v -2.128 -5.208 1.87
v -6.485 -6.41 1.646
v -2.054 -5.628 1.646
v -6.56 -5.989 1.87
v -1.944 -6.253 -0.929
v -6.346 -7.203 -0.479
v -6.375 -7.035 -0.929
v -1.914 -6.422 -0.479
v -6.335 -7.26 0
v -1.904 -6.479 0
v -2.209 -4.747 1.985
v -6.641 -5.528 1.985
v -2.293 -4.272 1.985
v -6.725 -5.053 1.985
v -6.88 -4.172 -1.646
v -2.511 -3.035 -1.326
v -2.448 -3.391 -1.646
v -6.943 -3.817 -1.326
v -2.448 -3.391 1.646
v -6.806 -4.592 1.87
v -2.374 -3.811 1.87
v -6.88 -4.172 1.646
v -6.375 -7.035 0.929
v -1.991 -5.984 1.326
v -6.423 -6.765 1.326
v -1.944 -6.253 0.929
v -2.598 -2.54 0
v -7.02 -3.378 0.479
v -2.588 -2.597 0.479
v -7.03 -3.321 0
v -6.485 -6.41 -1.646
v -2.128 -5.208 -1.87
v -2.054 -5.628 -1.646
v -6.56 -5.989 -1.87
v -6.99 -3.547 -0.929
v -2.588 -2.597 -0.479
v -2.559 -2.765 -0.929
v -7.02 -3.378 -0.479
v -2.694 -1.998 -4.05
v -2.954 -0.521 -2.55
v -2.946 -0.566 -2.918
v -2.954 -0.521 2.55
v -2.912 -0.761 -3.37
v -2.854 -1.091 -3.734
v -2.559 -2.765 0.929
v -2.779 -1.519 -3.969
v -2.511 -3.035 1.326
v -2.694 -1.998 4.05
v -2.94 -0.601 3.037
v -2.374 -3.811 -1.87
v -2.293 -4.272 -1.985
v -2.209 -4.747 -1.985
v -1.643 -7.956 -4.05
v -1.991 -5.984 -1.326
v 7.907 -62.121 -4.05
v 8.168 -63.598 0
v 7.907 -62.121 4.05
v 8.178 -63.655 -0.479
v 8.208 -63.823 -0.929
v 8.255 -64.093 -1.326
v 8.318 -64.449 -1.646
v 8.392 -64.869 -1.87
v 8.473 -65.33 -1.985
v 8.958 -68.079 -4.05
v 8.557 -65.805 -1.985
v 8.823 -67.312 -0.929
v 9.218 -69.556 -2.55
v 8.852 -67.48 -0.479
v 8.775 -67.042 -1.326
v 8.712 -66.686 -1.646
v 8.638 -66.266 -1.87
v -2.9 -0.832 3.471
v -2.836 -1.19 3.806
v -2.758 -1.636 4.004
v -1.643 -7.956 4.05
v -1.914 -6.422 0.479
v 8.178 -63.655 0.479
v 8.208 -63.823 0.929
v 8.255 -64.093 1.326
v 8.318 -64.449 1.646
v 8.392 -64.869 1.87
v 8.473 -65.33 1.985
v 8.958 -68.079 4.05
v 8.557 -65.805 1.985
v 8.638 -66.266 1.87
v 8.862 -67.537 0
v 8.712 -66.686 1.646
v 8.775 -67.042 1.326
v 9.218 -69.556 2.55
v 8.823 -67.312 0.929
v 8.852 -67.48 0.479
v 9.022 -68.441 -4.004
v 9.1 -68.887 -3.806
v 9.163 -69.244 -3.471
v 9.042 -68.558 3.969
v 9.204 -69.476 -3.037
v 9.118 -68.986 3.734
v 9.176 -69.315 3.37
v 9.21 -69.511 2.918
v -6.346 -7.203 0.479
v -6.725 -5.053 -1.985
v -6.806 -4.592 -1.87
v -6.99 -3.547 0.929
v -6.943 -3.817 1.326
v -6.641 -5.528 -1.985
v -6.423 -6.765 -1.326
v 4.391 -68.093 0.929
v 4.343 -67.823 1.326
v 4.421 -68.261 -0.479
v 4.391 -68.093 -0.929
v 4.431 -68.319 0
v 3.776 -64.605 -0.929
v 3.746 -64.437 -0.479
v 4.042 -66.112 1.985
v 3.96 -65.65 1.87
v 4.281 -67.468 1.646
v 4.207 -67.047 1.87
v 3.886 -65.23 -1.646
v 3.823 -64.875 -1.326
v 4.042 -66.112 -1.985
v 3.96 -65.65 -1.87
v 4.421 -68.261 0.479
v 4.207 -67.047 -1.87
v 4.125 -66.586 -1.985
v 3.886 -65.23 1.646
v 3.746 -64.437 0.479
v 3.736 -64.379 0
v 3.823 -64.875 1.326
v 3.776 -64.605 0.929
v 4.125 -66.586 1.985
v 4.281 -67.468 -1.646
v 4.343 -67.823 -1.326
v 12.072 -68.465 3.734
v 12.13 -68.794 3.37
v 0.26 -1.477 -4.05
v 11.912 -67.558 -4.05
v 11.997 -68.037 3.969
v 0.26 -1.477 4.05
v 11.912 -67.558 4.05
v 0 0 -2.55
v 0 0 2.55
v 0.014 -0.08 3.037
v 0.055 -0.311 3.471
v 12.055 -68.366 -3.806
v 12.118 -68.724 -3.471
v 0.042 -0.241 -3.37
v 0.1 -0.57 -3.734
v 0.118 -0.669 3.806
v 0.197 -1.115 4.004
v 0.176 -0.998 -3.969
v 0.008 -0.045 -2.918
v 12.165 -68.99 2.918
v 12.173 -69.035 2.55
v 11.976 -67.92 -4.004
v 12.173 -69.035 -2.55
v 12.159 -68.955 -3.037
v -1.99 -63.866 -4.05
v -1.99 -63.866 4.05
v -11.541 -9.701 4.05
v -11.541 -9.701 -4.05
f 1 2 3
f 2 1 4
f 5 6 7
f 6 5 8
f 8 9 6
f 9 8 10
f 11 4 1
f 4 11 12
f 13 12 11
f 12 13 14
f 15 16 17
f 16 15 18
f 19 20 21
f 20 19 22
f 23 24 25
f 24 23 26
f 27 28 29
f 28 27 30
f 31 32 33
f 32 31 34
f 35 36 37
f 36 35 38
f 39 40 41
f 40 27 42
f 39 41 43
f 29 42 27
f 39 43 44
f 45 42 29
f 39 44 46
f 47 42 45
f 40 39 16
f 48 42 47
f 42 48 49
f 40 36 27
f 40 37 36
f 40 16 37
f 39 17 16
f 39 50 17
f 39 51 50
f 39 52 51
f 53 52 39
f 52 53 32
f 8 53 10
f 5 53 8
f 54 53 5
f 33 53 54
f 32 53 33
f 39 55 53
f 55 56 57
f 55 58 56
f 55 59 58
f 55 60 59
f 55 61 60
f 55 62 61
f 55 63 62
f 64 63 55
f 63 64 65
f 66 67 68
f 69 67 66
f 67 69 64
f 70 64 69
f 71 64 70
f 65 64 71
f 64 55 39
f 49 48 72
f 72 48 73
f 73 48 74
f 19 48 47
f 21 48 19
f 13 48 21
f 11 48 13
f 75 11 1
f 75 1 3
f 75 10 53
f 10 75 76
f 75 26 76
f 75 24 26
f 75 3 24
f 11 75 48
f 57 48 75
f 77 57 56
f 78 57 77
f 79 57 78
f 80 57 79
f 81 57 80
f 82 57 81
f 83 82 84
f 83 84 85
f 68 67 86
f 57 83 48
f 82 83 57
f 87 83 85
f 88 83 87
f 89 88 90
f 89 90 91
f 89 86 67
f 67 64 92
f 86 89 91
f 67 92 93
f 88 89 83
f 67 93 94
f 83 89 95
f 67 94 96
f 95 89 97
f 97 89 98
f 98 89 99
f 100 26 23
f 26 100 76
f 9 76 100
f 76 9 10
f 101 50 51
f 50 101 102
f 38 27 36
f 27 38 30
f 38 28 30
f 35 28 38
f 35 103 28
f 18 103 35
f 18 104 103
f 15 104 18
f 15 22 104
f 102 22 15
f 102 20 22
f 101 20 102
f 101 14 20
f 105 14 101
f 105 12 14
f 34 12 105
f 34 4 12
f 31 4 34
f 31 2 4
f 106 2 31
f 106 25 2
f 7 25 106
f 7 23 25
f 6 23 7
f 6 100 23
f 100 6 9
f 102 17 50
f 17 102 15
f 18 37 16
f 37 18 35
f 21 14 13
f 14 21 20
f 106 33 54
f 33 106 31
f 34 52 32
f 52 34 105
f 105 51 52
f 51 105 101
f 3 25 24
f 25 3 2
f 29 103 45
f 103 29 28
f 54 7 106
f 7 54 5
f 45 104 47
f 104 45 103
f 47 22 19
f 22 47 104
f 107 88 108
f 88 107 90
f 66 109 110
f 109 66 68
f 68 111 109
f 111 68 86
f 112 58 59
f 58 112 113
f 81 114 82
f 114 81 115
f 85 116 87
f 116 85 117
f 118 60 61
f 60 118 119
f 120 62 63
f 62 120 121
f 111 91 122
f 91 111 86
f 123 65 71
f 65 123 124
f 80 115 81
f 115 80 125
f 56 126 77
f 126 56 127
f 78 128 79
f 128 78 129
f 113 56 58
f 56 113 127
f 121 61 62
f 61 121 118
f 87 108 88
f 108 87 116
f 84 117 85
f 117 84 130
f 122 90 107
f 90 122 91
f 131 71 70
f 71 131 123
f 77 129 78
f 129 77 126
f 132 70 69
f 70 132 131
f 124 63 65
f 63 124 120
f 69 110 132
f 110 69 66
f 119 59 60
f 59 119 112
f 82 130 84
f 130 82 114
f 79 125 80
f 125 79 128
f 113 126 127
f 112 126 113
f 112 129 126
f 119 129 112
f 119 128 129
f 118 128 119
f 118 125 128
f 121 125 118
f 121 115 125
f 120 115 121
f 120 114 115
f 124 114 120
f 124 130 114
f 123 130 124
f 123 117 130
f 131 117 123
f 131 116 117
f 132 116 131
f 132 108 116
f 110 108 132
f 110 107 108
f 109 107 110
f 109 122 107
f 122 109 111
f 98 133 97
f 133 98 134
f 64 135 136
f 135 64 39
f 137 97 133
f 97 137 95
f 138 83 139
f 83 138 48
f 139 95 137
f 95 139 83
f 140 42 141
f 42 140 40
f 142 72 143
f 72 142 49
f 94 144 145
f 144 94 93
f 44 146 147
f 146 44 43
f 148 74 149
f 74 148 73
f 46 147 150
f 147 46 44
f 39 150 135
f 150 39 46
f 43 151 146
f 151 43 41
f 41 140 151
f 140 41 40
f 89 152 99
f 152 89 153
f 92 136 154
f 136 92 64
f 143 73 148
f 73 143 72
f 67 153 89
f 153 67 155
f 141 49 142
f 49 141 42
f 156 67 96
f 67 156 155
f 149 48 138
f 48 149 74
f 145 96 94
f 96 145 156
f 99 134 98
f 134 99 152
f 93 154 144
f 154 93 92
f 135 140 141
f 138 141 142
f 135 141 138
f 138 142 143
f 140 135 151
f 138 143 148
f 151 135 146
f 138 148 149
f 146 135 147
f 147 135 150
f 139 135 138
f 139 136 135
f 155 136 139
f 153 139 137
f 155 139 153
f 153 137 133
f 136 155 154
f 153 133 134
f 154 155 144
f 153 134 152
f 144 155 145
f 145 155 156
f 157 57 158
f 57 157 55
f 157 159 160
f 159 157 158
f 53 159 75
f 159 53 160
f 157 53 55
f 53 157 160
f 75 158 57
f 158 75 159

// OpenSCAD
// file: util.scad
include <geometry.scad>

$fa = 1.0;
$fs = 0.5;

module each_pos(positions) {
  for (pos = positions) {
    translate([pos.x, pos.y, 0])
      children();
  }
}

// These exist because I couldn't get dims out of the DXF file for
// some reason.  OpenSCAD would return the position of the text label,
// not the actual dim.

module round(amount=4)
{
  offset(r = amount)
    offset(delta = -amount)
    children();
}

// A side (c) and two adjacent angles (A, B) given (ASA)
//
// Returns a vector where the elements are remaining sides (a and b)
// and the other angle (C).
//
// https://en.wikipedia.org/wiki/Solution_of_triangles#A_side_and_two_adjacent_angles_given_(ASA)
function triangle_asa(c, A, B) =
  let ( C = 180 - A - B
      , a = c * sin(A) / sin(C)
      , b = c * sin(B) / sin(C)
      )
  [a, b, C];

// A side (c), one adjacent angle (A) and the opposite angle (C) given (AAS)
function triangle_aas(c, A, C) =
  let ( B = 180 - A - C
      , a = c * sin(A) / sin(C)
      , b = c * sin(B) / sin(C)
      )
  [ a, b, B ];

let ( t = triangle_aas(7, 35, 62) )
assert(round(t[0]) == 5 && round(t[1]) == 8 && t[2] == 83, t);

// Two sides (a, b) and the included angle (C) given (SAS).
function triangle_sas(a, b, C) =
  let ( c = sqrt(pow(a, 2) + pow(b, 2) - (2 * a * b * cos(C)))
      , A = acos((pow(b, 2) + pow(c, 2) - pow(a, 2)) / (2 * b * c))
      , B = 180 - A - C
      )
  [ c, A, B];

let ( t = triangle_sas(5, 7, 49) )
assert(round(t[0]) == 5 && round(t[1]) == 45 && round(t[2]) == 86, t);

module m3_insert(center=false)
{
  translate([0, 0, center ? 0 : m3_insert_depth/2])
    cylinder(d=m3_insert_dia,
             h=m3_insert_depth,
             center=true);
}

module m3_stud(wall_thickness=2, height)
{
  outer_dia = m3_insert_dia + wall_thickness;

  difference() {
    cylinder(d=outer_dia, h=height, center=true);
    cylinder(d=m3_insert_dia, h=height+0.2, center=true);
  }
}

// A tapered M3 screw head.
//
// The head is centered.
module m3_screw_head(height)
{
  upper_dia = 6 + tolerance;
  lower_dia = 3 + tolerance;
  rim_height = 0.75;
  head_height = 2;
  body_height = height - head_height;

  translate([0, 0, -(height/2)])  {
    translate([0, 0, body_height]) {
      hull() {
        translate([0, 0, head_height + rim_height/2])
          cylinder(d=upper_dia, h=rim_height, center=true);

        translate([0, 0, rim_height/2])
          cylinder(d=lower_dia, h=rim_height, center=true);
      }
    }

    translate([0, 0, body_height/2])
      cylinder(d=lower_dia, h=body_height, center=true);
  }
}

module usb_c_plug(h=23) {
  width = 11.5;
  dia = 6.25;
  gap = width/2 - dia/2;

  hull() {
    translate([-gap, 0, 0])
      cylinder(d=dia, h=h, center=true);

    translate([gap, 0, 0])
      cylinder(d=dia, h=h, center=true);
  }
}

module trrs_plug(h=15) {
  cylinder(d=7.5, h=h, center=true);
}

usb_c_plug();
// file: geometry.scad
default_plate_thickness =
  1.6;

tolerance = 0.1;

module pcb_shape() {
  import(file="../redox/pcb.dxf", layer="PCB");
}

pcb_hole_positions =
  [ [   6.2230,  -5.2070 ]
  , [ 116.7130,  -3.3020 ]
  , [  23.3680, -80.1370 ]
  , [ 133.8580, -95.5040 ]
  ];

pcb_hole_dia =
  4.0;

module shell_shape() {
  import(file="../redox/pcb.dxf", layer="Shell");
}

case_hole_positions =
  [ [  -5.7858,   -1.3050 ]
  , [ 143.0628,   -1.3050 ]
  , [  -5.7858,  -98.4215 ]
  , [ 158.2978, -114.6142 ]
  ];

// Position for each switch as it sits on the left-hand keyboard.
//
// Returns an array of positions.  Each position is itself an array
// with the following elements:
//
// 0: X.
// 1: Y.
// 2: Angle in degrees.
// 3: Key cap units in the X direction.
// 4: Key cap units in the Y direction.
//
// All measurements are to the center of the switch, and assume the
// PCB is at the origin going in the positive X direction and negative
// Y direction.
switch_positions =
  let ( row_sep = -19.05,
      , c1x =  11.9380, c1y = -17.9370, c1r5x = 14.4780
      , c2x =  33.5280, c2y = c1y
      , c3x =  52.5780, c3y = -13.4920
      , c4x =  71.6280, c4y = -10.9520
      , c5x =  90.6780, c5y = -13.4920
      , c6x = 109.7280, c6y = -15.3970
      , c7x = 128.7780
      )
  [
    // Column 1
      [ c1x,   c1y + row_sep * 0, 0, 1.25, 1.0 ] // Row 1
    , [ c1x,   c1y + row_sep * 1, 0, 1.25, 1.0 ] // Row 2
    , [ c1x,   c1y + row_sep * 2, 0, 1.25, 1.0 ] // Row 3
    , [ c1x,   c1y + row_sep * 3, 0, 1.25, 1.0 ] // Row 4
    , [ c1r5x, c1y + row_sep * 4, 0, 1.0,  1.0 ] // Row 5

    // Column 2:
    , [ c2x,   c2y + row_sep * 0, 0, 1.0, 1.0 ] // Row 1
    , [ c2x,   c2y + row_sep * 1, 0, 1.0, 1.0 ] // Row 2
    , [ c2x,   c2y + row_sep * 2, 0, 1.0, 1.0 ] // Row 3
    , [ c2x,   c2y + row_sep * 3, 0, 1.0, 1.0 ] // Row 4
    , [ c2x,   c2y + row_sep * 4, 0, 1.0, 1.0 ] // Row 5

    // Column 3:
    , [ c3x,   c3y + row_sep * 0, 0, 1.0, 1.0 ] // Row 1
    , [ c3x,   c3y + row_sep * 1, 0, 1.0, 1.0 ] // Row 2
    , [ c3x,   c3y + row_sep * 2, 0, 1.0, 1.0 ] // Row 3
    , [ c3x,   c3y + row_sep * 3, 0, 1.0, 1.0 ] // Row 4
    , [ c3x,   c3y + row_sep * 4, 0, 1.0, 1.0 ] // Row 5

    // Column 4:
    , [ c4x,   c4y + row_sep * 0, 0, 1.0, 1.0 ] // Row 1
    , [ c4x,   c4y + row_sep * 1, 0, 1.0, 1.0 ] // Row 2
    , [ c4x,   c4y + row_sep * 2, 0, 1.0, 1.0 ] // Row 3
    , [ c4x,   c4y + row_sep * 3, 0, 1.0, 1.0 ] // Row 4
    , [ c4x,   c4y + row_sep * 4, 0, 1.0, 1.0 ] // Row 5

    // Column 5:
    , [ c5x,   c5y + row_sep * 0, 0, 1.0, 1.0 ] // Row 1
    , [ c5x,   c5y + row_sep * 1, 0, 1.0, 1.0 ] // Row 2
    , [ c5x,   c5y + row_sep * 2, 0, 1.0, 1.0 ] // Row 3
    , [ c5x,   c5y + row_sep * 3, 0, 1.0, 1.0 ] // Row 4

    // Column 6:
    , [ c6x,   c6y + row_sep * 0, 0, 1.0, 1.0 ] // Row 1
    , [ c6x,   c6y + row_sep * 1, 0, 1.0, 1.0 ] // Row 2
    , [ c6x,   c6y + row_sep * 2, 0, 1.0, 1.0 ] // Row 3
    , [ c6x,   c6y + row_sep * 3, 0, 1.0, 1.0 ] // Row 4

    // Column 7:
    , [ c7x,   -24.9220, 0,  1.0, 1.0 ] // Row 1.5
    , [ c7x,   -49.0520, 90, 1.5, 1.0 ] // Row 2.5

    // Thumb Keys:
    , [  97.0280,   -92.8670, -15,  1.25, 1.0 ]
    , [ 132.5880,   -78.8970, -30,  1.0,  1.0 ]
    , [ 149.0980,   -88.3920, -30,  1.0,  1.0 ]
    , [ 120.5230,   -99.8520, -120, 1.5,  1.0 ]
    , [ 137.03301, -109.3470, -120, 1.5,  1.0 ]
  ];

pcb_leg_positions =
  [ [   2.7220,  -27.3546 ]
  , [   2.8070,  -65.5913 ]
  , [  22.6819,  -46.4306 ]
  , [  42.9018,  -27.5592 ]
  , [  43.4402,  -61.0724 ]
  , [  62.0000,  -3.0300  ]
  , [  62.5043,  -39.8026 ]
  , [  62.2639,  -78.4369 ]
  , [  81.1491,  -51.5879 ]
  , [ 100.0563,  -81.6159 ]
  , [ 100.0000,  -23.0300 ]
  , [ 100.0000,  -61.6264 ]
  , [ 104.3878, -103.7437 ]
  , [ 119.0000,  -25.0300 ]
  , [ 119.0000,  -63.1460 ]
  , [ 136.0000,  -37.0000 ]
  ];


// Should be large enough to accommodate an M3 insert.
m3_insert_dia = 4;
m3_insert_depth = 4.5;

dim_shell_rot = -10;
dim_shell_offset_x = 11.5625;
dim_shell_offset_y = 8;
// Offset from the shell to the PCB on the right side.
dim_shell_offset_y2 = 7.94;
dim_shell_x1 = 160.33;
dim_shell_max_x = 184.1642;
dim_shell_max_y = 138.40;
dim_mount_len = 72;
dim_mount_offset_y = 15;
dim_mount_depth = 12;


dim_trrs_x = 129; // From left edge of PCB to center of TRRS jack
dim_trrs_z = 4; // From top of PCB to center of jack
dim_trrs_y = 6.25; // From pcb to shell;

dim_usb_x = 71.25; // From left edge of the PCB to center of the USB port
dim_usb_z = 6.9;  // From top of PCB to center of USB port.
/* dim_usb_z = 2.9;  // From top of PCB to center of USB port. */
dim_usb_y = 3.58; // From PCB to shell.
dim_usb_overhang = 3; // USB port positive overhang off the PCB on Y axis.

dim_microcontroller_x = 18.6; // How wide is the Pro Micro/Elite-C?
// main file
include <geometry.scad>
use <util.scad>

function mounting_surface_screw_locations(wall_thickness, width, height) =
  let ( x_offset = wall_thickness + 1
      , y_offset = height / 2
      )
  [ [ x_offset,         -y_offset ]
  , [ width - x_offset, -y_offset ]
  ];

function mounting_surface_cargo_width(wall_thickness, width, height) =
  let (screw_locations =
        mounting_surface_screw_locations(wall_thickness, width, height)
      , screw_offset = (screw_locations[0][0] + (m3_insert_dia/2)) * 2
      )
    width - screw_offset - wall_thickness;

function mounting_surface_joint_height(actual_height) =
  actual_height - 3;

// A single join centered on the origin.
module mounting_surface_joint(
  depth=10,
  width=8,
  height=8,
  for_cutout=false)
{
  fit_height = mounting_surface_joint_height(height);

  rotate([0, -90, 0])
    translate([0, 0, -(width/2)])
    linear_extrude(height=width, convexity=10,  slices=100)
    offset(delta = for_cutout ? tolerance/2 : 0)
    polygon(
      points =
        [ [ -(depth/2), -(fit_height/2) ]
        , [ depth/2,    -(fit_height/2) ]
        , [ depth/2,     (fit_height/2) ]
        , [ -(depth/2),  0          ]
        ]);
}

// The base of the mounting adapters which attaches to the case.
//
// The object will have it's X and Y axes centered on the origin,
// while the part sits on 0 for the Z axes.
module mounting_surface_base(
  wall_thickness=3,
  width=70,
  height=8,
  rounding_constant=1.5)
{
  screw_locations =
    mounting_surface_screw_locations(
      wall_thickness,
      width,
      height);

  difference() {
    linear_extrude(height=wall_thickness, convexity=10,  slices=100)
      round(amount=rounding_constant)
      square(size=[width, height], center=true);

    each_pos(positions=screw_locations)
      translate([-(width/2), -(height/2), wall_thickness/2])
      m3_screw_head(height=wall_thickness);
  }
}

// The internal parts of the mounting surface that need to be cut out
// of the case.
//
// The object is rotated and it's top-right corner placed on the
// origin.  The object is centered on the Z axis.
module mounting_surface_cutout(
  wall_thickness=3,
  width=70,
  height=8,
  rounding_constant=1.5,
  max_cargo_depth=10)
{
  screw_locations =
    mounting_surface_screw_locations(
      wall_thickness,
      width,
      height);

  screw_depth =
    m3_insert_depth;

  cargo_width
    = width
    - (screw_locations[0][0] + (m3_insert_dia/2)) * 2
    - wall_thickness;

  total_height
    = wall_thickness
    + max_cargo_depth
    + tolerance/2;

  total_width
    = width
    + tolerance;

  z_for_center = (total_height/2) - wall_thickness;

  tri1 = triangle_aas(total_width/2, 90, 90 - abs(dim_shell_rot));
  tri2 = triangle_aas(total_height/2 - tri1[1], abs(dim_shell_rot), 90);

  /* translate([-triangle_x[0], -triangle_y[0], 0]) */
  translate([-tri2[1], -(tri1[0] + tri2[0]), 0])
    rotate([-90 , 0 , -90 - dim_shell_rot])
    translate([0, 0, z_for_center])
    difference() {
    union() {
      linear_extrude(height=wall_thickness, convexity=10,  slices=100)
        round(amount=rounding_constant)
        offset(delta = tolerance/2)
        square(size=[width, height], center=true);

      // Holes for the M3 screw inserts:
      each_pos(positions=screw_locations)
        translate([-(width/2), height/2, -(screw_depth/2)])
        cylinder(d=m3_insert_dia,
                 h=screw_depth,
                 center=true);

      // Carve out the cargo area:
      translate([0, 0, -((max_cargo_depth + tolerance/2)/2)])
        cube([ cargo_width
               , height + tolerance
               , max_cargo_depth + tolerance/2
               ], center=true);
    }
  }
}

module mounting_surface_adapter_positive(
  wall_thickness=3,
  width=70,
  height=8,
  rounding_constant=1.5,
  joint_count=3,
  max_cargo_depth=10)
{
  cargo_length =
    mounting_surface_cargo_width(
      wall_thickness,
      width,
      height);

  mounting_surface_base(
    wall_thickness=wall_thickness,
    width=width,
    height=height,
    rounding_constant=rounding_constant);

  translate([-(cargo_length/4), 0, (max_cargo_depth/2) + wall_thickness])
    rotate([0, 0, 180])
    mounting_surface_joint(
      depth=max_cargo_depth,
      width=cargo_length/2,
      height=height,
      for_cutout=false);
}

module mounting_surface_adapter_negative(
  wall_thickness=3,
  width=70,
  height=8,
  rounding_constant=1.5,
  joint_count=3,
  max_cargo_depth=10)
{
  cargo_length =
    mounting_surface_cargo_width(
      wall_thickness,
      width,
      height);

  joint_height =
    mounting_surface_joint_height(height);

  difference() {
    union() {
      mounting_surface_base(
        wall_thickness=wall_thickness,
        width=width,
        height=height,
        rounding_constant=rounding_constant);

      translate([0, 0, -(height/2)])
        cube([cargo_length, height, max_cargo_depth],
          center=true);
    }

  translate([-(cargo_length/4), 0, -(max_cargo_depth/2) + wall_thickness])
    rotate([0, 180, 0])
    mounting_surface_joint(
      depth=max_cargo_depth,
      width=cargo_length/2,
      height=height,
      for_cutout=true);

  translate([cargo_length/4, 0, -(max_cargo_depth/2) + wall_thickness])
    cube([cargo_length/2, joint_height, max_cargo_depth],
        center=true);
  }
}

mounting_surface_cutout();
